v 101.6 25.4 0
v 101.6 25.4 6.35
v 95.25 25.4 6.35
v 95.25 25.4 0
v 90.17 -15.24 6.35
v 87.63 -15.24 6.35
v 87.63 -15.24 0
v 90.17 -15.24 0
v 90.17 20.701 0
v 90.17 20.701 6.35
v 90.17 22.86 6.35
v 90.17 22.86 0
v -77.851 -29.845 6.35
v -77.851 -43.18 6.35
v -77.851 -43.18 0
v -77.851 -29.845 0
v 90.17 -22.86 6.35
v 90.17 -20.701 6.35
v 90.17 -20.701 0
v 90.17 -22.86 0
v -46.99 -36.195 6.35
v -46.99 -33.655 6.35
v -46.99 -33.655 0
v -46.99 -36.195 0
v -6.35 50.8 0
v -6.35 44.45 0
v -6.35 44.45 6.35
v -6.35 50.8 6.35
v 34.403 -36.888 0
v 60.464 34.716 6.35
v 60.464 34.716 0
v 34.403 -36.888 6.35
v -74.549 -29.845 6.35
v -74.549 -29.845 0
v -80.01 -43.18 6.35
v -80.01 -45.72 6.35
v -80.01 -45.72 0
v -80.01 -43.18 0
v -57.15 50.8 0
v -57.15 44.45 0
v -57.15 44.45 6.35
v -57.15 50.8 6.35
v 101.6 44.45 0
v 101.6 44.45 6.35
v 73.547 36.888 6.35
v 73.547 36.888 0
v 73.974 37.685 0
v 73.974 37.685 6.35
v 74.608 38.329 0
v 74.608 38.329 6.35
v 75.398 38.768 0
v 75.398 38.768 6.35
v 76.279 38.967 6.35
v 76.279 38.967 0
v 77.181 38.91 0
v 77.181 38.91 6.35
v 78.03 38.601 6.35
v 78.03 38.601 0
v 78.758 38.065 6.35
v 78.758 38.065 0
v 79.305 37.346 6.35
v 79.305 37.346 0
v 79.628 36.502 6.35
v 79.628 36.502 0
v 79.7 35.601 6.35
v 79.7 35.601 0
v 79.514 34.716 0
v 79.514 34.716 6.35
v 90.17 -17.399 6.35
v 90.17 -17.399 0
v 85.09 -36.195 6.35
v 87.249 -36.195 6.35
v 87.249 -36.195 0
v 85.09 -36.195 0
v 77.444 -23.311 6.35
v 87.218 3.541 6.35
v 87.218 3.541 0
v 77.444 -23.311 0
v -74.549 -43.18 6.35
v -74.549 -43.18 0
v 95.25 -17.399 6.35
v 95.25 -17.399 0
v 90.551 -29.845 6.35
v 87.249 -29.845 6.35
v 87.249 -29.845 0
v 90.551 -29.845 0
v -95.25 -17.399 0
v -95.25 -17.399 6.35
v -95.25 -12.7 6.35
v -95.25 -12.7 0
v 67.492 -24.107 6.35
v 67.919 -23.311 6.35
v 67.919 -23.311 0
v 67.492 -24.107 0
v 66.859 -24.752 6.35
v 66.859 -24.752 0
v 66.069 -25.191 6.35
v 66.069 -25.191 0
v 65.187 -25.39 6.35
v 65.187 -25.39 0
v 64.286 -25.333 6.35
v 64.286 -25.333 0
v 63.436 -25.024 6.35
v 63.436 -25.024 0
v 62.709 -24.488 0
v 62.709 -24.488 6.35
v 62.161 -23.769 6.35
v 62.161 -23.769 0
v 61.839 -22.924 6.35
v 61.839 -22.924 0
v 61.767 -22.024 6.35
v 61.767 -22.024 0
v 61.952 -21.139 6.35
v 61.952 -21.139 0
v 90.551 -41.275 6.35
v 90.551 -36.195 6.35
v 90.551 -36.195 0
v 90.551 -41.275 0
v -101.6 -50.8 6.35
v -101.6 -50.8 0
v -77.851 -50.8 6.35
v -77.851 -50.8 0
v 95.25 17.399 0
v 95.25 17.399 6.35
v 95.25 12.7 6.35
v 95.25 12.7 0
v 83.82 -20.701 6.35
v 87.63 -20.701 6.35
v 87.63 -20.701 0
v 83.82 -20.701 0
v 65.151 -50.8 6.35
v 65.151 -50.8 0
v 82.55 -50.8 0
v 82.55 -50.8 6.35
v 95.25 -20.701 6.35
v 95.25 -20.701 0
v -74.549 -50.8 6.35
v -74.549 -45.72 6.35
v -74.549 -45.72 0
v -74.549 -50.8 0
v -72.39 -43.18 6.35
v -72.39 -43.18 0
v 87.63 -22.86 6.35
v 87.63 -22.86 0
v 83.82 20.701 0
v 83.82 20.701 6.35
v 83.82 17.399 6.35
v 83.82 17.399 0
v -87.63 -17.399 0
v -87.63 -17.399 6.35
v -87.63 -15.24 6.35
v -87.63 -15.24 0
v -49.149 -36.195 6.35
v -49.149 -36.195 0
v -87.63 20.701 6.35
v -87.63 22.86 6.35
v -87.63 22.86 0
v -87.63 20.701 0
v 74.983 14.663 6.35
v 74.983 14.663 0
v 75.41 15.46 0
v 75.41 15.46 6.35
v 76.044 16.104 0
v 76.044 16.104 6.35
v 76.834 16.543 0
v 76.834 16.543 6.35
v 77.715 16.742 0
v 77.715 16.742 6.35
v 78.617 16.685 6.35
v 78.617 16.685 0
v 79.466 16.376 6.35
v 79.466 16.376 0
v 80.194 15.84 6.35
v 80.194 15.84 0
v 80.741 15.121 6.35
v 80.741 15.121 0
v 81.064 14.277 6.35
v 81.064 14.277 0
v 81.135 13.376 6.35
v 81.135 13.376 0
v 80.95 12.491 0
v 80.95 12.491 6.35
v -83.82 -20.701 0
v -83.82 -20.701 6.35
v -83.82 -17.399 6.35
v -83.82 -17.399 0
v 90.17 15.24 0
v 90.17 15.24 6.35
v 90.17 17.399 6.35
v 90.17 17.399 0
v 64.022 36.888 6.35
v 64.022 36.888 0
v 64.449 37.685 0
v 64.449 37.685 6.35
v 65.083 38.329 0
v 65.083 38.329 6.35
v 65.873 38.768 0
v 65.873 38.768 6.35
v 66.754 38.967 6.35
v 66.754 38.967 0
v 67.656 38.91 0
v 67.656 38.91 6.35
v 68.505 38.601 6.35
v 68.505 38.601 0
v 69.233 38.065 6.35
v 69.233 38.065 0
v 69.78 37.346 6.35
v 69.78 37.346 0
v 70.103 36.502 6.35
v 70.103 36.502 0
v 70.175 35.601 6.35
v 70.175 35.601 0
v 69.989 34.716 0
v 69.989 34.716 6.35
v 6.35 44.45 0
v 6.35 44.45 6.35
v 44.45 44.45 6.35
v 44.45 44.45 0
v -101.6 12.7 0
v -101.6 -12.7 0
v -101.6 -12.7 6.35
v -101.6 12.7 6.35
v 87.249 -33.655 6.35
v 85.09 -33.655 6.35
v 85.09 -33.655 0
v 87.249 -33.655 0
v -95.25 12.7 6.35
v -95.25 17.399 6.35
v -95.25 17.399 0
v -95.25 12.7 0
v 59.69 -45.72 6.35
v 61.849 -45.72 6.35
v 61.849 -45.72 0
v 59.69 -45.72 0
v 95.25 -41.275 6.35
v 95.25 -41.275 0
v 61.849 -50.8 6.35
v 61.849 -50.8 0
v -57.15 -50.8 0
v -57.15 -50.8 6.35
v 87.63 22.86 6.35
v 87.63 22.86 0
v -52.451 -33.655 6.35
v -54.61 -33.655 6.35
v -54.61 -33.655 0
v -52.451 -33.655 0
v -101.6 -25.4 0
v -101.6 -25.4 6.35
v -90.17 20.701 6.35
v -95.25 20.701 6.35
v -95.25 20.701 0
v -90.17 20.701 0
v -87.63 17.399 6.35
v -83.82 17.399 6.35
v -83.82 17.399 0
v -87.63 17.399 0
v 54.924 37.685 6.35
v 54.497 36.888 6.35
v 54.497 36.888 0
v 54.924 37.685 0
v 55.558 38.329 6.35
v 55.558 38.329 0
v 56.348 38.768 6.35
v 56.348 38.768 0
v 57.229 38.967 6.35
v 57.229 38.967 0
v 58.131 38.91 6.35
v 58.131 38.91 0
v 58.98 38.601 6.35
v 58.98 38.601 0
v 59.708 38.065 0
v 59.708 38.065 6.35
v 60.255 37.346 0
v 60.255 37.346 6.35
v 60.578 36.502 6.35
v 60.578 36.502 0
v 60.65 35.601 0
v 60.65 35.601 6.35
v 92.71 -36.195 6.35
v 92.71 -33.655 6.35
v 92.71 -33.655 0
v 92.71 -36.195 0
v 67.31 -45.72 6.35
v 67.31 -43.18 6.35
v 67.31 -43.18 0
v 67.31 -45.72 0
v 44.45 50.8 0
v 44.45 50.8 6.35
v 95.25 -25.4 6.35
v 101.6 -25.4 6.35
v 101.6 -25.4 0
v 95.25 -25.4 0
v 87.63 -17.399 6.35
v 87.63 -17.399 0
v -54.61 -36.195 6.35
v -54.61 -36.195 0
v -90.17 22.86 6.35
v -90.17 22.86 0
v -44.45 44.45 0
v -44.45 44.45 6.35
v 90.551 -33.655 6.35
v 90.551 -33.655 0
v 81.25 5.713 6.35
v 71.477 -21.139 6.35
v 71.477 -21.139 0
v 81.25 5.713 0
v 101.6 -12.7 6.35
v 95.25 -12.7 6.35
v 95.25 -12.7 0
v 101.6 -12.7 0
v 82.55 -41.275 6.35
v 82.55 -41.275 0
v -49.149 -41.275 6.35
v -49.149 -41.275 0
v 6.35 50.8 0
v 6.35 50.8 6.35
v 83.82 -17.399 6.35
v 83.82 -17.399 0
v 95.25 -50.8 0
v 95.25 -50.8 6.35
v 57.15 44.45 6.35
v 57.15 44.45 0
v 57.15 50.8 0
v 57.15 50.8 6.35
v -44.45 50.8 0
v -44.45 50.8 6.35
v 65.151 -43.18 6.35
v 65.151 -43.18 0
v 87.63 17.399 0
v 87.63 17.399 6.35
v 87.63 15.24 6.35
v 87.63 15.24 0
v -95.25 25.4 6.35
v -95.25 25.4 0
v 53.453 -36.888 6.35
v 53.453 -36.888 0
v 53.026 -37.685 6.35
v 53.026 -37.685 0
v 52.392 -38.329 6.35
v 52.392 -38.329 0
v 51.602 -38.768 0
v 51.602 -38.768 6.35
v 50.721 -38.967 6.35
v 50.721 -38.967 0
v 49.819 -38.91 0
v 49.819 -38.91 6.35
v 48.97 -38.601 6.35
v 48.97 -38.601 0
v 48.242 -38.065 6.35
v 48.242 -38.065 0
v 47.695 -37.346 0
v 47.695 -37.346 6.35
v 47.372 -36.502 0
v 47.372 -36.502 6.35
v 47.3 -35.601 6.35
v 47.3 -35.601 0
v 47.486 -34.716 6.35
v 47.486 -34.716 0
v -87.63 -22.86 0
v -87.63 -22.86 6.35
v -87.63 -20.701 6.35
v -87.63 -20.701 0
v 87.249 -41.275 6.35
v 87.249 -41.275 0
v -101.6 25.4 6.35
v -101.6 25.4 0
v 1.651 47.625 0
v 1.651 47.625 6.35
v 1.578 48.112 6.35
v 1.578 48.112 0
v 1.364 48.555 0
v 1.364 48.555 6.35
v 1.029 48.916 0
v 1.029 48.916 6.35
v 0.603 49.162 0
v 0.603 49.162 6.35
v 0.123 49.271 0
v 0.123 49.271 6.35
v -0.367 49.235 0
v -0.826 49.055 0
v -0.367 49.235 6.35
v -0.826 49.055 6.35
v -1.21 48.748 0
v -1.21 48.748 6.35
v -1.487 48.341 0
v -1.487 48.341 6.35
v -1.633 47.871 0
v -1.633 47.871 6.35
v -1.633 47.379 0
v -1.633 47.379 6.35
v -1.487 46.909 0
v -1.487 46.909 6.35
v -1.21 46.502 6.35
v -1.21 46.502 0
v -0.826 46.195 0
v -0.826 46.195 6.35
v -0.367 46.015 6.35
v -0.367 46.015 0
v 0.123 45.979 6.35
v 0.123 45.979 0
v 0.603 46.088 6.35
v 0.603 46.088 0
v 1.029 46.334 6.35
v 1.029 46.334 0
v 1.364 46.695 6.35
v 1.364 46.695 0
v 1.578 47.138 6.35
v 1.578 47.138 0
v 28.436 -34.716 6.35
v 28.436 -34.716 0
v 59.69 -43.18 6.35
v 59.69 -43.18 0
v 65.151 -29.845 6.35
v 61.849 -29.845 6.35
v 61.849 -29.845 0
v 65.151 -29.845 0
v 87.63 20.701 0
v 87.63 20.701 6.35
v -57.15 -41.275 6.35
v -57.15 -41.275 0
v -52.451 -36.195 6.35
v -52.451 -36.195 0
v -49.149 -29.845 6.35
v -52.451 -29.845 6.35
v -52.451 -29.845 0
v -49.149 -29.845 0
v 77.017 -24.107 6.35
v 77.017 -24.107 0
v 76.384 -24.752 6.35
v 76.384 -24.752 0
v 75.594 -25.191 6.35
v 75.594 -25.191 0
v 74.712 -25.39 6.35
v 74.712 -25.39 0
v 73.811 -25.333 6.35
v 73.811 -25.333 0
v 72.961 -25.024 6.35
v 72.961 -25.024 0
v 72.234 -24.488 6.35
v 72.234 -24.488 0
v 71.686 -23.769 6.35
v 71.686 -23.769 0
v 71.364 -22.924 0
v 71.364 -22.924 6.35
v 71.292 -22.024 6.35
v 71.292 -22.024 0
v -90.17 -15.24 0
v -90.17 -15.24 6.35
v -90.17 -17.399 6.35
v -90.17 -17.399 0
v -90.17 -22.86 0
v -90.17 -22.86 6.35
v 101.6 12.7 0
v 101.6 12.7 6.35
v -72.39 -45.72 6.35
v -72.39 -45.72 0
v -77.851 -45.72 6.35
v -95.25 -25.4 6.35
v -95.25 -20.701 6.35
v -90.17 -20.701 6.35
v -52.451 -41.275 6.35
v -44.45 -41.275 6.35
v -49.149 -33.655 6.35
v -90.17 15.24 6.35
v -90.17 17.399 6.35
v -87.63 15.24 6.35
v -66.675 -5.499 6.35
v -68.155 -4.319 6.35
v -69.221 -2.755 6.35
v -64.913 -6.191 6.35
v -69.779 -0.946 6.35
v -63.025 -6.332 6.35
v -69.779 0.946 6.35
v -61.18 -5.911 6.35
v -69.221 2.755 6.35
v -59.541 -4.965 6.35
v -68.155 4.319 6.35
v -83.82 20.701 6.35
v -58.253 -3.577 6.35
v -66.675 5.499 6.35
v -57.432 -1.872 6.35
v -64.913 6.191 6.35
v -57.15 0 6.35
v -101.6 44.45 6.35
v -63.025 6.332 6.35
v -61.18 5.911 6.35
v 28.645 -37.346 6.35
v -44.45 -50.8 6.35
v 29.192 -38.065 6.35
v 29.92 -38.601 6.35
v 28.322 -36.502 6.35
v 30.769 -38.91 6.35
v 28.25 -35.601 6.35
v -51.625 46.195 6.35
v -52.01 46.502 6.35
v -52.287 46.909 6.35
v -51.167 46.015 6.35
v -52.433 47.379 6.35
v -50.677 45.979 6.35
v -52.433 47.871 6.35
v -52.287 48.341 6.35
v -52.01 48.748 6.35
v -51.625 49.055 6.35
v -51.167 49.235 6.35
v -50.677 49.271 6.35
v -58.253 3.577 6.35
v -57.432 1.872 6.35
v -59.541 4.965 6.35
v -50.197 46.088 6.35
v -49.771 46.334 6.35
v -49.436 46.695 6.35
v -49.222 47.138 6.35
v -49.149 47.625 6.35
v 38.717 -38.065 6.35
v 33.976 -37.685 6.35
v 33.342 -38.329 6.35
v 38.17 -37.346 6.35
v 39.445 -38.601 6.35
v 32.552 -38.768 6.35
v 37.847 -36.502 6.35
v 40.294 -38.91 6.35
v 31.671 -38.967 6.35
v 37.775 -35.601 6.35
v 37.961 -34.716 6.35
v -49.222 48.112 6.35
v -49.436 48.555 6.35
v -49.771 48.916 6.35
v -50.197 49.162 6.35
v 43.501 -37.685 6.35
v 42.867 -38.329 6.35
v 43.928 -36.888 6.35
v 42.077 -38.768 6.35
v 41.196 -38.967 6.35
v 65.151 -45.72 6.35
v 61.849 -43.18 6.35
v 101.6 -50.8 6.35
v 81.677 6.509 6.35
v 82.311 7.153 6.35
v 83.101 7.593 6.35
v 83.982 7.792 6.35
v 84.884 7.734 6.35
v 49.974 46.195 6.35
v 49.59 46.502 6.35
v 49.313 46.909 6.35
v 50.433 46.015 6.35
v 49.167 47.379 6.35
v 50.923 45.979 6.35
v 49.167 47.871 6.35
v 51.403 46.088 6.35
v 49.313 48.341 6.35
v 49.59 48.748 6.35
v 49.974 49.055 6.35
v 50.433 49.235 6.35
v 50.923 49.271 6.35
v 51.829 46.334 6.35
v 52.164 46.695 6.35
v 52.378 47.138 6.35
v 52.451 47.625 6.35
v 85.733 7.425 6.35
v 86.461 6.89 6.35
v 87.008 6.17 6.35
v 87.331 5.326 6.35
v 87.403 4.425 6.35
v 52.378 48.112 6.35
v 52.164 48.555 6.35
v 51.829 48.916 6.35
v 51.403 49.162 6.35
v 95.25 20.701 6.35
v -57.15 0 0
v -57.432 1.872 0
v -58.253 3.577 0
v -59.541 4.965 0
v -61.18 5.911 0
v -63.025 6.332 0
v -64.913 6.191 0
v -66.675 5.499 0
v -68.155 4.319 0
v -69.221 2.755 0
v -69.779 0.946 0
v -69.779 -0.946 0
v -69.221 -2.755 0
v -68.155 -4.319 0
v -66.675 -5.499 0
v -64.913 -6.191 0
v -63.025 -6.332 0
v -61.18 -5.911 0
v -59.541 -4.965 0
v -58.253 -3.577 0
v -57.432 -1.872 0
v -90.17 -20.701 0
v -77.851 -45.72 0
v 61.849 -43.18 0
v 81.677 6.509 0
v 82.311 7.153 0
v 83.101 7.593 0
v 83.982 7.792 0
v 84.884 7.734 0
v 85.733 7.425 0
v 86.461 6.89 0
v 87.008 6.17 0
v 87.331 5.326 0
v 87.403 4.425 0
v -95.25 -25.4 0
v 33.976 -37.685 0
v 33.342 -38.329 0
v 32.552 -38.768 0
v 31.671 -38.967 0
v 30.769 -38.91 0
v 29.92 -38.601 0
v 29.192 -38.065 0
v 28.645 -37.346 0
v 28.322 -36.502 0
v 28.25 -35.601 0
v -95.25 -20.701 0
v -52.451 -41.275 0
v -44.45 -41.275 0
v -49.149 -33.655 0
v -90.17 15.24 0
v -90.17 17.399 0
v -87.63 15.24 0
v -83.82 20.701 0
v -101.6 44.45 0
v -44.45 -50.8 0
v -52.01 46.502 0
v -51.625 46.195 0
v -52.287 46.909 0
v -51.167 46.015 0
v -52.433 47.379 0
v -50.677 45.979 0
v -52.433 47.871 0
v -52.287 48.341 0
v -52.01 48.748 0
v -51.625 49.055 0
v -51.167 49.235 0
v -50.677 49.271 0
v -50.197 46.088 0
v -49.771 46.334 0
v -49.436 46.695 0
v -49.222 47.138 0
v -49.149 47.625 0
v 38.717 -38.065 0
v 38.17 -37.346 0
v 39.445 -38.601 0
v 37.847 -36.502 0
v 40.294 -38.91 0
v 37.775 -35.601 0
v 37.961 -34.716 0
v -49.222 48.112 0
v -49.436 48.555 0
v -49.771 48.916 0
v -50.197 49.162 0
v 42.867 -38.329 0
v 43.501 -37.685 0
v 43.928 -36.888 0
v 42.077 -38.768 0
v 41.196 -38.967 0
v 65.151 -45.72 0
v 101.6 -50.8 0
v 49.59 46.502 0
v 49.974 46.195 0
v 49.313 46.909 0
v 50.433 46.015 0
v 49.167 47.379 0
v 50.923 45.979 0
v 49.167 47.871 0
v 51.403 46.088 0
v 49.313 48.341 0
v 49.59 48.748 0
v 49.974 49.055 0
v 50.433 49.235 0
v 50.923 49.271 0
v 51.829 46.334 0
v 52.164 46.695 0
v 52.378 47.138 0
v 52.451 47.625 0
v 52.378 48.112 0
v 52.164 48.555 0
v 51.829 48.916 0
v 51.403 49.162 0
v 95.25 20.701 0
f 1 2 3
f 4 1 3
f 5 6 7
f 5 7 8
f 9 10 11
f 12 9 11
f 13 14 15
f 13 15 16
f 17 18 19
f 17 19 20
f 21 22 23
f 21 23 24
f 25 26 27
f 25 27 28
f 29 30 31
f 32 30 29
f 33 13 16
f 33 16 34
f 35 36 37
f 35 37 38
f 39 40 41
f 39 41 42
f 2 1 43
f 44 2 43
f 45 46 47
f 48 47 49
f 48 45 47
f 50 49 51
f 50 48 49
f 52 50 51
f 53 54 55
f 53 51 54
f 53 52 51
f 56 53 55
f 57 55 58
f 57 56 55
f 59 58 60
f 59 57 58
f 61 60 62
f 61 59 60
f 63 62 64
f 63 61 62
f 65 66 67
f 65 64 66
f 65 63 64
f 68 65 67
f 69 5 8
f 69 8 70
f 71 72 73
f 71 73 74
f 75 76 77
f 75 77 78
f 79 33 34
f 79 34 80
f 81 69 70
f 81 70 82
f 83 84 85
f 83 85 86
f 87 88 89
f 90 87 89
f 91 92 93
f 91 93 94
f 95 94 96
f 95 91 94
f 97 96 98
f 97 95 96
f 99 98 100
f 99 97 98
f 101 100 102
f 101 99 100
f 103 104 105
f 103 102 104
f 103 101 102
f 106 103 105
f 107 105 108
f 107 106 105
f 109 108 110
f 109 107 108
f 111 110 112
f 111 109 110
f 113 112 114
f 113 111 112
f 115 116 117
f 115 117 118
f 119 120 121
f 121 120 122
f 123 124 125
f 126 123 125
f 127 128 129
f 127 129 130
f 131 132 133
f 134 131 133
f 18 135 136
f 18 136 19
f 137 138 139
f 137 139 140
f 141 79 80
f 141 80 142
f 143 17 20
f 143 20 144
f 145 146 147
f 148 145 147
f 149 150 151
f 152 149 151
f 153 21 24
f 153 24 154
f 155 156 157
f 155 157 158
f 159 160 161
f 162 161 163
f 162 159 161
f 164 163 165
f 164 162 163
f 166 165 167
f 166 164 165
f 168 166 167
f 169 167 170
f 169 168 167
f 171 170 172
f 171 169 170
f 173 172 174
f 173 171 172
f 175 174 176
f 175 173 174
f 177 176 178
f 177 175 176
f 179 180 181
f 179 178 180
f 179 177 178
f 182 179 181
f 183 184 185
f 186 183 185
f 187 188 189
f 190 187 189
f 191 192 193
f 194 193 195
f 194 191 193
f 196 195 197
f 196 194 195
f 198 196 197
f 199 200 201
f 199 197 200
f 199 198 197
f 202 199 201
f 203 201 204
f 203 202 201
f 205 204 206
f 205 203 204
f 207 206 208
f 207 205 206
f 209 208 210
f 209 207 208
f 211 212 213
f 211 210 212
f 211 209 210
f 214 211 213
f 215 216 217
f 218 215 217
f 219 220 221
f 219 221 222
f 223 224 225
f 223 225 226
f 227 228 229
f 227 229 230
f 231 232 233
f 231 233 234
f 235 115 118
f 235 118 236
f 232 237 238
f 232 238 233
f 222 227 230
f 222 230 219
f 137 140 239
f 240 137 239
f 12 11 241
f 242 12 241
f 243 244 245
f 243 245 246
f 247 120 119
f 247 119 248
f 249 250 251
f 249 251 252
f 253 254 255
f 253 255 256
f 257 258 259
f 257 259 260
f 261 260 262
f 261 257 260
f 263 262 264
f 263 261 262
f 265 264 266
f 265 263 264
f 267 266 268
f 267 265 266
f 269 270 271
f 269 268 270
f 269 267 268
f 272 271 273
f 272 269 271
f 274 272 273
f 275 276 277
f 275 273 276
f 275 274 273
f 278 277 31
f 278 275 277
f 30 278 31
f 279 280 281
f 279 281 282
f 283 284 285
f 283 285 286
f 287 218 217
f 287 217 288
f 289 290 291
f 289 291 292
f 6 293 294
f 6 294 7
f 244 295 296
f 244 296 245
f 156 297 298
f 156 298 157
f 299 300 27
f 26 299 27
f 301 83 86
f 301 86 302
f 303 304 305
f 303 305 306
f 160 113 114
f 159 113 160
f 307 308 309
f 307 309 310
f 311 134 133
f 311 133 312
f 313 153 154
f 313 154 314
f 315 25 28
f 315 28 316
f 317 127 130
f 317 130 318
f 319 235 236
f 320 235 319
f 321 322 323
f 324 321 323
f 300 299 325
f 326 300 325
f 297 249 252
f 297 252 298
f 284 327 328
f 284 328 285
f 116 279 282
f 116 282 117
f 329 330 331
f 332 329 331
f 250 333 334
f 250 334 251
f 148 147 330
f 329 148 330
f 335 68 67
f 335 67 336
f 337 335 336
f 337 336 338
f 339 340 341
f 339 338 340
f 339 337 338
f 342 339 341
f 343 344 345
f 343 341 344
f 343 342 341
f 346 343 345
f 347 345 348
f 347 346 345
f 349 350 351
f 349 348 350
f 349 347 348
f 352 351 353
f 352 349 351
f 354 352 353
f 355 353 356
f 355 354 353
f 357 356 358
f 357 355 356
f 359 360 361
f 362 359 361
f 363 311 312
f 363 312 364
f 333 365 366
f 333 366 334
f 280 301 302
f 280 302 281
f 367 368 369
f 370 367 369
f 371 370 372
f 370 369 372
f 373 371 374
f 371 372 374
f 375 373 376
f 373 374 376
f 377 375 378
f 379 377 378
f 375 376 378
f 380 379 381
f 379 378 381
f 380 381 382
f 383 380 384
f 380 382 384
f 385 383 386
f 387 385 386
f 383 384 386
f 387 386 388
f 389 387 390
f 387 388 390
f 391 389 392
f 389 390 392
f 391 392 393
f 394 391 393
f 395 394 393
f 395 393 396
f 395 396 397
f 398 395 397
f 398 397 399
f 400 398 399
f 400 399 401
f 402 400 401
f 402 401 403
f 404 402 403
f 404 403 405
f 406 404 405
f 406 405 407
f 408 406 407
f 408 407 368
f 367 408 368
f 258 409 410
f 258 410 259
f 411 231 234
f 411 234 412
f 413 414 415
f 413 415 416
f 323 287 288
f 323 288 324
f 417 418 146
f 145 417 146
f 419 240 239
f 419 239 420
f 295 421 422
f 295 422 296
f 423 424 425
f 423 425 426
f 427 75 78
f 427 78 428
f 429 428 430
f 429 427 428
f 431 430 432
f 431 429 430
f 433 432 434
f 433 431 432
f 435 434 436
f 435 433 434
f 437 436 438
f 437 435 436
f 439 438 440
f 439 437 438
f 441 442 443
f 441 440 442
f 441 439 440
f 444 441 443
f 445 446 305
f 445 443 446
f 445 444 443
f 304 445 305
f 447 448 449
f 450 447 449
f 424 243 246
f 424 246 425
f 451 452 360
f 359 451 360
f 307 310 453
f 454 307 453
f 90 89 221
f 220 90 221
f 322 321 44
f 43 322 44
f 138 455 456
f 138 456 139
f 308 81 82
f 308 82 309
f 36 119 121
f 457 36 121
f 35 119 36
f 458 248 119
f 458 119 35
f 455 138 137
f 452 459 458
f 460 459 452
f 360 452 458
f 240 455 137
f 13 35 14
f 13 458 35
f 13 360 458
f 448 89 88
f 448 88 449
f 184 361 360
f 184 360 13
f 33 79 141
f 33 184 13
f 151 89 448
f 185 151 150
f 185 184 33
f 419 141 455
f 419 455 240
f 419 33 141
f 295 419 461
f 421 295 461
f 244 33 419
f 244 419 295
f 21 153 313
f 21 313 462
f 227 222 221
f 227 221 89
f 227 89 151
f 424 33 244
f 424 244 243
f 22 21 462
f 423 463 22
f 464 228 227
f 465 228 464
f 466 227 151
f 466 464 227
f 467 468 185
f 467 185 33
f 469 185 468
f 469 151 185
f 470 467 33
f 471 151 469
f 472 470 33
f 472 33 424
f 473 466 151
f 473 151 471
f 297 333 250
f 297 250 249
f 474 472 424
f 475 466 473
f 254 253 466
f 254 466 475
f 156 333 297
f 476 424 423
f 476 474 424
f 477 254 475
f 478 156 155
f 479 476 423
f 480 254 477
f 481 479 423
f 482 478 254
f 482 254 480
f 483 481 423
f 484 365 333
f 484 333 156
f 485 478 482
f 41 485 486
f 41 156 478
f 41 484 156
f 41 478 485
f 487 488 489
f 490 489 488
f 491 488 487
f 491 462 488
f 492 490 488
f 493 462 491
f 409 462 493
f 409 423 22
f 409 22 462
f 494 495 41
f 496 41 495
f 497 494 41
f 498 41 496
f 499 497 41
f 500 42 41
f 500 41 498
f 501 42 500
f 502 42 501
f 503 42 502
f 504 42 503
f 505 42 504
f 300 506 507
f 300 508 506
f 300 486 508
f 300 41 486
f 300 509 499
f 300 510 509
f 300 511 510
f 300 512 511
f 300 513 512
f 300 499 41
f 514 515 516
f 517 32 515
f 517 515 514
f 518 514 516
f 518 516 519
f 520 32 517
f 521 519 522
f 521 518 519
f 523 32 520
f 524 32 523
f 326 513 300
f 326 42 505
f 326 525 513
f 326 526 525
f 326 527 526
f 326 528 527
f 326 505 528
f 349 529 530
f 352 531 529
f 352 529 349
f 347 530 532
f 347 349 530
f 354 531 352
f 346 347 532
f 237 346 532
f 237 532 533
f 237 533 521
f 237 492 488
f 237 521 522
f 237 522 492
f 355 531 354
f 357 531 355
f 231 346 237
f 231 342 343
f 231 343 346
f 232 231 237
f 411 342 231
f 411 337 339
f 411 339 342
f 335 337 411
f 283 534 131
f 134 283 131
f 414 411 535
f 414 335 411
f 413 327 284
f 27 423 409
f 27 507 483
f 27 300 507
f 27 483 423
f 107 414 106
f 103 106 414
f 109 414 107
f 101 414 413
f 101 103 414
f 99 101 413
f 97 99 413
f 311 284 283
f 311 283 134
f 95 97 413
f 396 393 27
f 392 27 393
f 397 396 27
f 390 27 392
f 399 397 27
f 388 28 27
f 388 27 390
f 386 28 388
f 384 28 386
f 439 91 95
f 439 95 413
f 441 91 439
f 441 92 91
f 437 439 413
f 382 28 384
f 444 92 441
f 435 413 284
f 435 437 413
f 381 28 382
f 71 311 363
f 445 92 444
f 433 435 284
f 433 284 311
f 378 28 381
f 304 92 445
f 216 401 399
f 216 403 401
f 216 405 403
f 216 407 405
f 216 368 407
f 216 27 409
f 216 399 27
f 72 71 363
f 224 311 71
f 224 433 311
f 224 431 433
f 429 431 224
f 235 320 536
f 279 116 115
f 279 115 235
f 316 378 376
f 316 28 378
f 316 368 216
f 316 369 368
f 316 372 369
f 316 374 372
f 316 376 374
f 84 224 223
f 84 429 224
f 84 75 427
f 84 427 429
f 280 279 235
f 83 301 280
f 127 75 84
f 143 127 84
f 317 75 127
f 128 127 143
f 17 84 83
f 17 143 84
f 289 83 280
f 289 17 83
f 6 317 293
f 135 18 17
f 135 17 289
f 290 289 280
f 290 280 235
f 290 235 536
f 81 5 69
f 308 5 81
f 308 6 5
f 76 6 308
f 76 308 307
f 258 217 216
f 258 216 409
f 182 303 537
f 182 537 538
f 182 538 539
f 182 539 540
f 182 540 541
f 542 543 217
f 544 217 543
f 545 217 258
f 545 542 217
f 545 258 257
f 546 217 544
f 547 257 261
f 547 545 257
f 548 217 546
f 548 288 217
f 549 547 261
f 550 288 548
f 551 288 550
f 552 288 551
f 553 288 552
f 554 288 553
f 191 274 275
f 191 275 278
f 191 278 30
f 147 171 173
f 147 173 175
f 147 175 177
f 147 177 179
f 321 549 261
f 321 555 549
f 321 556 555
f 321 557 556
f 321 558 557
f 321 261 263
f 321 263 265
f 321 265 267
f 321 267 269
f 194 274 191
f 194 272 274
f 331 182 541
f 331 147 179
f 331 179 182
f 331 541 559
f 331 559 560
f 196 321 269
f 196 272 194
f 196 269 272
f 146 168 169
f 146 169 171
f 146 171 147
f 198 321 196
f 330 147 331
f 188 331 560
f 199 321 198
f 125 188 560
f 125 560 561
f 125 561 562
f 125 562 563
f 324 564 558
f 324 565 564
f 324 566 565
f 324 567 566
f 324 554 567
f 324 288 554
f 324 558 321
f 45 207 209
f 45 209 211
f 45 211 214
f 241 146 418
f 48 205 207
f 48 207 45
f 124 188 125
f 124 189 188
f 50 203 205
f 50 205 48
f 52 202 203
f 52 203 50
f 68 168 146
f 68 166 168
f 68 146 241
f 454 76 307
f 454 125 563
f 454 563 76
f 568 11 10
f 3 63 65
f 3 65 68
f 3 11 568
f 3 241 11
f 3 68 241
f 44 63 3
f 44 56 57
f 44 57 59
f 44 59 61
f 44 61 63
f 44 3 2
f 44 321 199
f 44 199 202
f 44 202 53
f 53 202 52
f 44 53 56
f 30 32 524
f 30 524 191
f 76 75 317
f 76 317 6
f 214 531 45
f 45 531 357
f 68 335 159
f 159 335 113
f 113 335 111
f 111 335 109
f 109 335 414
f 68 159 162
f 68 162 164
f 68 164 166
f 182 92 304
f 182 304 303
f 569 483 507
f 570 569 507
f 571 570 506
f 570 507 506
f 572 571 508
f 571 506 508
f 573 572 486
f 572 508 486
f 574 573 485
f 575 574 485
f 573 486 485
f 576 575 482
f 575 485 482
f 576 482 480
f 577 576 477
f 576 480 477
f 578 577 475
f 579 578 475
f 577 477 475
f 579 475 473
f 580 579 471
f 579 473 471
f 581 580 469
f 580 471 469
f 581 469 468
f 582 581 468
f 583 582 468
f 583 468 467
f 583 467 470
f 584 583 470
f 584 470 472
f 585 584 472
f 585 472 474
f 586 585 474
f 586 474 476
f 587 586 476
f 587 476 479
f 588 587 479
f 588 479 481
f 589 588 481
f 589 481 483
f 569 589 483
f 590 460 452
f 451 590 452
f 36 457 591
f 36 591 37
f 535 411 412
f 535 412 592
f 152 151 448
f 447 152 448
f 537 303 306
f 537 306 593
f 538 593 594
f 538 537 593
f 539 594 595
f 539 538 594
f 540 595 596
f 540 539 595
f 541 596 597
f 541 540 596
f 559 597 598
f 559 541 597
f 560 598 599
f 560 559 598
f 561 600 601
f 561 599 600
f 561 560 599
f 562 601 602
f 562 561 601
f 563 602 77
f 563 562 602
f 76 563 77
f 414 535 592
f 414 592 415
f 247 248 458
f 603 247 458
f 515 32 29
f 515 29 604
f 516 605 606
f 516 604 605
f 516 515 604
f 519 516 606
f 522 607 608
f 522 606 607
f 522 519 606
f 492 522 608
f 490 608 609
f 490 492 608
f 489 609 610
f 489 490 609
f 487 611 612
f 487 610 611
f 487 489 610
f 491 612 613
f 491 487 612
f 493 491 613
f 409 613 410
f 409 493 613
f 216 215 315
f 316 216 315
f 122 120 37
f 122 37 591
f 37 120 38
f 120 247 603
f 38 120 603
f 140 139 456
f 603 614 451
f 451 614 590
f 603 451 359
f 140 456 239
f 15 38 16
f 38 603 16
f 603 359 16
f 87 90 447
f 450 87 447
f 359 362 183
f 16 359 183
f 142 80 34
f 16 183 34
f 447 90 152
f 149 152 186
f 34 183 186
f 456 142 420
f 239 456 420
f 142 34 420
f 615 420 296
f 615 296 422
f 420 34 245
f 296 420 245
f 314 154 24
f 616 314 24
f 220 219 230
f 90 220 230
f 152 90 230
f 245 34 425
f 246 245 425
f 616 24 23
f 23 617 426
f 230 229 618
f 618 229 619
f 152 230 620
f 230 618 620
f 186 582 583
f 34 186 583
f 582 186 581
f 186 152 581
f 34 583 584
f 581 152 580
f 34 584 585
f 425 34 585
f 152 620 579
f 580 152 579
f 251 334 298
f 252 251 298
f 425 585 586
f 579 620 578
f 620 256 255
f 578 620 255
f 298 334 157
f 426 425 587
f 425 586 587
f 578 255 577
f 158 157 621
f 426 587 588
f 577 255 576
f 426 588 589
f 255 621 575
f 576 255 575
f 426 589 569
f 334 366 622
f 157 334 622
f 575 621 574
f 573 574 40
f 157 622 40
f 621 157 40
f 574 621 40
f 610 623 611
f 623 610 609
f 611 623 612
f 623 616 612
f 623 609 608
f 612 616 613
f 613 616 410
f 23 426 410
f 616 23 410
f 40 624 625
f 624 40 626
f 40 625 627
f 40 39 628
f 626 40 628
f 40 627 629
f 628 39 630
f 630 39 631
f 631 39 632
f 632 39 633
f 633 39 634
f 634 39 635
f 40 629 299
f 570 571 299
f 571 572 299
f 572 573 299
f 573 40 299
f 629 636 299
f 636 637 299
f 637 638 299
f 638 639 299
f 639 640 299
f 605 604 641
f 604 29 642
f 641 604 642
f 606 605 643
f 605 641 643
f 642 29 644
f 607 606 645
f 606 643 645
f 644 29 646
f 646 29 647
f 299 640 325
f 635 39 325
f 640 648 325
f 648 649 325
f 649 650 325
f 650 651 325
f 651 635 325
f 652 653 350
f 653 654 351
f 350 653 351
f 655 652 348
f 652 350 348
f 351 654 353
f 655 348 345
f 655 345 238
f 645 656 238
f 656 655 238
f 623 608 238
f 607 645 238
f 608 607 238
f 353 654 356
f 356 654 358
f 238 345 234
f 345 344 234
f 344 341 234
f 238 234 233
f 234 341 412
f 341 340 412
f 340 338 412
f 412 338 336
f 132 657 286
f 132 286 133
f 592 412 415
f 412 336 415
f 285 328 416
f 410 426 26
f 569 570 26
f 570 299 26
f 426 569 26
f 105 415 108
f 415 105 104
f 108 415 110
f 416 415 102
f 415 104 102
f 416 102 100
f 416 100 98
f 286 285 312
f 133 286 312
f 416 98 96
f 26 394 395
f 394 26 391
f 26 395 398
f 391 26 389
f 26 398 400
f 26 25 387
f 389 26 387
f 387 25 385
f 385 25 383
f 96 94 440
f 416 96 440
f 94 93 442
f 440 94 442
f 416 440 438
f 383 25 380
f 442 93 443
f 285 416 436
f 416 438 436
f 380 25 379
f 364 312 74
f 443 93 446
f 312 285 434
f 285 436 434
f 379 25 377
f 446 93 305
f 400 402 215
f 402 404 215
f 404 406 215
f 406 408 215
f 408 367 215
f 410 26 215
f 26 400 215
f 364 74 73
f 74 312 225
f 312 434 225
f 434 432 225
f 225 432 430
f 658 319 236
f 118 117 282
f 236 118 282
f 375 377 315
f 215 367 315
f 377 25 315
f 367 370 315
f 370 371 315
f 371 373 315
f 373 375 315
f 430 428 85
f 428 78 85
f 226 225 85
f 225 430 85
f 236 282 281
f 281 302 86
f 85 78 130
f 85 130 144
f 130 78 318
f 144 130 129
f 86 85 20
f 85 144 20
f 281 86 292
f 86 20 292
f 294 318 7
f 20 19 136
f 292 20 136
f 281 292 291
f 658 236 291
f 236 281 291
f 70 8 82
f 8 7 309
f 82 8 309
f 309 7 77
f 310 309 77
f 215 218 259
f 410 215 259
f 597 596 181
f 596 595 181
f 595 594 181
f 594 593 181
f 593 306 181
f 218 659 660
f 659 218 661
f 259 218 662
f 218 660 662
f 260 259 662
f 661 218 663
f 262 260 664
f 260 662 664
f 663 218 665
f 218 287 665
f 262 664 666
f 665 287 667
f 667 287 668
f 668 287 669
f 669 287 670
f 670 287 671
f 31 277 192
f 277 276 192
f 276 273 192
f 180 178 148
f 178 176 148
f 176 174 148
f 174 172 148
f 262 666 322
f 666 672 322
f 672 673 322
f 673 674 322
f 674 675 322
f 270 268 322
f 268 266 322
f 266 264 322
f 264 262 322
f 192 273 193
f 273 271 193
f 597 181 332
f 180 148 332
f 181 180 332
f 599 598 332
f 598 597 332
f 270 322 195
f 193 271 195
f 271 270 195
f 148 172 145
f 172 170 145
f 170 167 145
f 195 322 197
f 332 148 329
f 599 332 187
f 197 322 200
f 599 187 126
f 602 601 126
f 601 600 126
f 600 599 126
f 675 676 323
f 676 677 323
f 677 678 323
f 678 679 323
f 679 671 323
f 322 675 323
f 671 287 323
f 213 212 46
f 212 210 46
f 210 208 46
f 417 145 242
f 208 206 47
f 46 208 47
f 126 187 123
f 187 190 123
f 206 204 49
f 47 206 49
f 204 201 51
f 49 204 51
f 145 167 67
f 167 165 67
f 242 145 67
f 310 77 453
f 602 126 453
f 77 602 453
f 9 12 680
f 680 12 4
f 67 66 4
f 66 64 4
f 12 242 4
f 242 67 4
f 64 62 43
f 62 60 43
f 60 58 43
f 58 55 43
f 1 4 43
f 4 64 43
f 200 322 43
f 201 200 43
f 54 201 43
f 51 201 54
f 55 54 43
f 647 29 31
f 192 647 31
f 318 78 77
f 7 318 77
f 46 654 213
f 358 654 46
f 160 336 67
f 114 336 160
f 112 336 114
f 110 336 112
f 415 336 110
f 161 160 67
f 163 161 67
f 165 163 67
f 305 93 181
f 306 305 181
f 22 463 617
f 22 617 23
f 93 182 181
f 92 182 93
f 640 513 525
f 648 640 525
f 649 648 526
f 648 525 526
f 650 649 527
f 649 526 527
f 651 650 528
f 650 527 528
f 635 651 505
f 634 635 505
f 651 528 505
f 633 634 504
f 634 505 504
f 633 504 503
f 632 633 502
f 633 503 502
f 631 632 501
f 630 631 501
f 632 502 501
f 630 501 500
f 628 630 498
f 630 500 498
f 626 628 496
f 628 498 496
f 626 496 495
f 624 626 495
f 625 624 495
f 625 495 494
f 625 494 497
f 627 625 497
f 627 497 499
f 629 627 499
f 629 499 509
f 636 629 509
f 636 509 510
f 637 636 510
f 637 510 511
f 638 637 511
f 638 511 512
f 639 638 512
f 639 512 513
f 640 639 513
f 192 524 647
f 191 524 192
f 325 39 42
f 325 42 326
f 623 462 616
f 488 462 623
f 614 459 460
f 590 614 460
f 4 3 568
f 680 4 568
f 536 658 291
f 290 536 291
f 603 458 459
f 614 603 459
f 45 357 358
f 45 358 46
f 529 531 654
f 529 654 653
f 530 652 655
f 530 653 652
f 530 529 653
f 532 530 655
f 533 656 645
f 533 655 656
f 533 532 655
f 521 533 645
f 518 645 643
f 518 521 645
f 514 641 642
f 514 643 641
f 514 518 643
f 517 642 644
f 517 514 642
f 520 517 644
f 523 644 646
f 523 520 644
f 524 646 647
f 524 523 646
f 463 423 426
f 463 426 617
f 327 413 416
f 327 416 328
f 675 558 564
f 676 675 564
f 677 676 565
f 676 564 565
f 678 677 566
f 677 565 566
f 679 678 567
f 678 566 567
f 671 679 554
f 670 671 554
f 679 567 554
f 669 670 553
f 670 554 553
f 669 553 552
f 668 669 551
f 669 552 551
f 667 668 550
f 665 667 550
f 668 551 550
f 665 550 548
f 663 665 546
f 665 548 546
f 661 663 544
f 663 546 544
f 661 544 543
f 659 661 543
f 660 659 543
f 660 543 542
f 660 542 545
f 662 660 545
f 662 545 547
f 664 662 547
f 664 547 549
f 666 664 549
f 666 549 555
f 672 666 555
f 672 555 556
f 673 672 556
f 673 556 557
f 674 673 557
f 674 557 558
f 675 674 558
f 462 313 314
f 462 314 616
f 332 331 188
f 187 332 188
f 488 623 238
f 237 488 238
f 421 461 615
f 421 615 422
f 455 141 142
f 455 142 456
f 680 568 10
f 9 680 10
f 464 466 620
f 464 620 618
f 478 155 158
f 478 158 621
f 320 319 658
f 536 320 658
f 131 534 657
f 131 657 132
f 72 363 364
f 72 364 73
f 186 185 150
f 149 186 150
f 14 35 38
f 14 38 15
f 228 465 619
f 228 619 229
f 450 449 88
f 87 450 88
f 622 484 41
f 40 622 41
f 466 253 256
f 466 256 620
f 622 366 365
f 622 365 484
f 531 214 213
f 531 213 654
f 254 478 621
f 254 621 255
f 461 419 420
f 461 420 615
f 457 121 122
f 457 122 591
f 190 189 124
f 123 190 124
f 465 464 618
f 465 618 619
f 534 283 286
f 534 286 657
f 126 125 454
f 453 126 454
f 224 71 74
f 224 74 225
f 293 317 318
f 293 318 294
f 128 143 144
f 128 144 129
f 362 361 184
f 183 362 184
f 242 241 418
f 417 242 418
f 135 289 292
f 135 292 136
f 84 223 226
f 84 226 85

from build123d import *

# Parameters (mm, degrees)
SKETCH1_W            = 203.2
SKETCH1_H            = 101.6
BOSS_EXTRUDE1_DEPTH  = 6.35
CUT_EXTRUDE2_DEPTH   = 114.769602707
MIRROR1_COPY_1_DEPTH = 114.769602707
SKETCH2_R            = 1.651
SKETCH2_W            = 44.45
SKETCH2_H            = 6.35
SKETCH2_W_2          = 38.1
CUT_EXTRUDE1_DEPTH   = 114.769602707
SKETCH4_R            = 6.35
CUT_EXTRUDE3_DEPTH   = 114.769602707
CUT_EXTRUDE4_DEPTH   = 114.769602707
LPATTERN1_COUNT      = 3
LPATTERN1_PITCH      = 9.525
CUT_EXTRUDE5_DEPTH   = 114.769602707


with BuildPart() as part:
    # Sketch1 → Boss-Extrude1 (new body)
    with BuildSketch(Plane.XY):
        Rectangle(SKETCH1_W, SKETCH1_H)
    extrude(amount=BOSS_EXTRUDE1_DEPTH)

    # Sketch3 → Cut-Extrude2 (cut, through all)
    with BuildSketch(Plane.XY.offset(6.35)):
        Polygon((101.6, 25.4), (95.25, 25.4), (95.25, 20.701), (90.17, 20.701), (90.17, 22.86), (87.63, 22.86), (87.63, 20.701), (83.82, 20.701), (83.82, 17.399), (87.63, 17.399), (87.63, 15.24), (90.17, 15.24), (90.17, 17.399), (95.25, 17.399), (95.25, 12.7), (101.6, 12.7), align=None)
    cut_extrude2 = extrude(amount=-CUT_EXTRUDE2_DEPTH, mode=Mode.SUBTRACT)

    # Mirror4: Cut-Extrude2 across plane
    add(cut_extrude2.mirror(Plane.ZX), mode=Mode.SUBTRACT)

    # Mirror1: Cut-Extrude2 across plane
    add(cut_extrude2.mirror(Plane(origin=(0, 0, 0), x_dir=(0, 0, 1), z_dir=(1, 0, 0))), mode=Mode.SUBTRACT)

    # Mirror1 copy 1 sketch → Mirror1 copy 1 (cut, through all)
    with BuildSketch(Plane(origin=(0, 0, 6.35), x_dir=(-1, 0, 0), z_dir=(0, 0, 1))):
        Polygon((101.6, 25.4), (95.25, 25.4), (95.25, 20.701), (90.17, 20.701), (90.17, 22.86), (87.63, 22.86), (87.63, 20.701), (83.82, 20.701), (83.82, 17.399), (87.63, 17.399), (87.63, 15.24), (90.17, 15.24), (90.17, 17.399), (95.25, 17.399), (95.25, 12.7), (101.6, 12.7), align=None)
    extrude(amount=-MIRROR1_COPY_1_DEPTH, mode=Mode.SUBTRACT)

    # Sketch2 → Cut-Extrude1 (cut, through all)
    with BuildSketch(Plane.XY.offset(6.35)):
        with Locations((-50.8, 47.625)):
            Circle(SKETCH2_R)
        with Locations((0, 47.625)):
            Circle(SKETCH2_R)
        with Locations((50.8, 47.625)):
            Circle(SKETCH2_R)
        with Locations((-79.375, 47.625)):
            Rectangle(SKETCH2_W, SKETCH2_H)
        with Locations((-25.4, 47.625)):
            Rectangle(SKETCH2_W_2, SKETCH2_H)
        with Locations((25.4, 47.625)):
            Rectangle(SKETCH2_W_2, SKETCH2_H)
        with Locations((79.375, 47.625)):
            Rectangle(SKETCH2_W, SKETCH2_H)
        Polygon((-57.15, -50.8), (-57.15, -41.275), (-52.451, -41.275), (-52.451, -36.195), (-54.61, -36.195), (-54.61, -33.655), (-52.451, -33.655), (-52.451, -29.845), (-49.149, -29.845), (-49.149, -33.655), (-46.99, -33.655), (-46.99, -36.195), (-49.149, -36.195), (-49.149, -41.275), (-44.45, -41.275), (-44.45, -50.8), align=None)
        Polygon((82.55, -50.8), (82.55, -41.275), (87.249, -41.275), (87.249, -36.195), (85.09, -36.195), (85.09, -33.655), (87.249, -33.655), (87.249, -29.845), (90.551, -29.845), (90.551, -33.655), (92.71, -33.655), (92.71, -36.195), (90.551, -36.195), (90.551, -41.275), (95.25, -41.275), (95.25, -50.8), align=None)
        Polygon((61.849, -29.845), (65.151, -29.845), (65.151, -43.18), (67.31, -43.18), (67.31, -45.72), (65.151, -45.72), (65.151, -50.8), (61.849, -50.8), (61.849, -45.72), (59.69, -45.72), (59.69, -43.18), (61.849, -43.18), align=None)
        Polygon((-77.851, -50.8), (-77.851, -45.72), (-80.01, -45.72), (-80.01, -43.18), (-77.851, -43.18), (-77.851, -29.845), (-74.549, -29.845), (-74.549, -43.18), (-72.39, -43.18), (-72.39, -45.72), (-74.549, -45.72), (-74.549, -50.8), align=None)
    extrude(amount=-CUT_EXTRUDE1_DEPTH, mode=Mode.SUBTRACT)

    # Sketch4 → Cut-Extrude3 (cut, through all)
    with BuildSketch(Plane.XY.offset(6.35)):
        with Locations((-63.5, 0)):
            Circle(SKETCH4_R)
    extrude(amount=-CUT_EXTRUDE3_DEPTH, mode=Mode.SUBTRACT)

    # Sketch5 → Cut-Extrude4 (cut, through all)
    with BuildSketch(Plane.XY.offset(6.35)):
        with BuildLine():
            Line((47.485508468, -34.716374897), (73.54744339, 36.888202807))
            ThreePointArc((73.54744339, 36.888202807), (77.616881416, 38.785812923), (79.514491532, 34.716374897))
            Line((79.514491532, 34.716374897), (53.45255661, -36.888202807))
            ThreePointArc((53.45255661, -36.888202807), (49.383118584, -38.785812923), (47.485508468, -34.716374897))
        make_face()
    cut_extrude4 = extrude(amount=-CUT_EXTRUDE4_DEPTH, mode=Mode.SUBTRACT)

    # LPattern1: Cut-Extrude4 ×3
    with Locations(*[(-i * LPATTERN1_PITCH, 0, 0) for i in range(1, LPATTERN1_COUNT)]):
        add(cut_extrude4, mode=Mode.SUBTRACT)

    # Sketch6 → Cut-Extrude5 (cut, through all)
    with BuildSketch(Plane.XY.offset(6.35)):
        with BuildLine():
            Line((61.952237472, -21.139086045), (74.983204933, 14.663202807))
            ThreePointArc((74.983204933, 14.663202807), (79.052642959, 16.560812923), (80.950253075, 12.491374897))
            Line((80.950253075, 12.491374897), (67.919285614, -23.310913955))
            ThreePointArc((67.919285614, -23.310913955), (63.849847588, -25.208524071), (61.952237472, -21.139086045))
        make_face()
        with BuildLine():
            Line((87.21751121, 3.540802684), (77.444285614, -23.310913955))
            ThreePointArc((77.444285614, -23.310913955), (73.374847588, -25.208524071), (71.477237472, -21.139086045))
            Line((71.477237472, -21.139086045), (81.250463068, 5.712630594))
            ThreePointArc((81.250463068, 5.712630594), (85.319901094, 7.61024071), (87.21751121, 3.540802684))
        make_face()
    extrude(amount=-CUT_EXTRUDE5_DEPTH, mode=Mode.SUBTRACT)


solid = part.part
